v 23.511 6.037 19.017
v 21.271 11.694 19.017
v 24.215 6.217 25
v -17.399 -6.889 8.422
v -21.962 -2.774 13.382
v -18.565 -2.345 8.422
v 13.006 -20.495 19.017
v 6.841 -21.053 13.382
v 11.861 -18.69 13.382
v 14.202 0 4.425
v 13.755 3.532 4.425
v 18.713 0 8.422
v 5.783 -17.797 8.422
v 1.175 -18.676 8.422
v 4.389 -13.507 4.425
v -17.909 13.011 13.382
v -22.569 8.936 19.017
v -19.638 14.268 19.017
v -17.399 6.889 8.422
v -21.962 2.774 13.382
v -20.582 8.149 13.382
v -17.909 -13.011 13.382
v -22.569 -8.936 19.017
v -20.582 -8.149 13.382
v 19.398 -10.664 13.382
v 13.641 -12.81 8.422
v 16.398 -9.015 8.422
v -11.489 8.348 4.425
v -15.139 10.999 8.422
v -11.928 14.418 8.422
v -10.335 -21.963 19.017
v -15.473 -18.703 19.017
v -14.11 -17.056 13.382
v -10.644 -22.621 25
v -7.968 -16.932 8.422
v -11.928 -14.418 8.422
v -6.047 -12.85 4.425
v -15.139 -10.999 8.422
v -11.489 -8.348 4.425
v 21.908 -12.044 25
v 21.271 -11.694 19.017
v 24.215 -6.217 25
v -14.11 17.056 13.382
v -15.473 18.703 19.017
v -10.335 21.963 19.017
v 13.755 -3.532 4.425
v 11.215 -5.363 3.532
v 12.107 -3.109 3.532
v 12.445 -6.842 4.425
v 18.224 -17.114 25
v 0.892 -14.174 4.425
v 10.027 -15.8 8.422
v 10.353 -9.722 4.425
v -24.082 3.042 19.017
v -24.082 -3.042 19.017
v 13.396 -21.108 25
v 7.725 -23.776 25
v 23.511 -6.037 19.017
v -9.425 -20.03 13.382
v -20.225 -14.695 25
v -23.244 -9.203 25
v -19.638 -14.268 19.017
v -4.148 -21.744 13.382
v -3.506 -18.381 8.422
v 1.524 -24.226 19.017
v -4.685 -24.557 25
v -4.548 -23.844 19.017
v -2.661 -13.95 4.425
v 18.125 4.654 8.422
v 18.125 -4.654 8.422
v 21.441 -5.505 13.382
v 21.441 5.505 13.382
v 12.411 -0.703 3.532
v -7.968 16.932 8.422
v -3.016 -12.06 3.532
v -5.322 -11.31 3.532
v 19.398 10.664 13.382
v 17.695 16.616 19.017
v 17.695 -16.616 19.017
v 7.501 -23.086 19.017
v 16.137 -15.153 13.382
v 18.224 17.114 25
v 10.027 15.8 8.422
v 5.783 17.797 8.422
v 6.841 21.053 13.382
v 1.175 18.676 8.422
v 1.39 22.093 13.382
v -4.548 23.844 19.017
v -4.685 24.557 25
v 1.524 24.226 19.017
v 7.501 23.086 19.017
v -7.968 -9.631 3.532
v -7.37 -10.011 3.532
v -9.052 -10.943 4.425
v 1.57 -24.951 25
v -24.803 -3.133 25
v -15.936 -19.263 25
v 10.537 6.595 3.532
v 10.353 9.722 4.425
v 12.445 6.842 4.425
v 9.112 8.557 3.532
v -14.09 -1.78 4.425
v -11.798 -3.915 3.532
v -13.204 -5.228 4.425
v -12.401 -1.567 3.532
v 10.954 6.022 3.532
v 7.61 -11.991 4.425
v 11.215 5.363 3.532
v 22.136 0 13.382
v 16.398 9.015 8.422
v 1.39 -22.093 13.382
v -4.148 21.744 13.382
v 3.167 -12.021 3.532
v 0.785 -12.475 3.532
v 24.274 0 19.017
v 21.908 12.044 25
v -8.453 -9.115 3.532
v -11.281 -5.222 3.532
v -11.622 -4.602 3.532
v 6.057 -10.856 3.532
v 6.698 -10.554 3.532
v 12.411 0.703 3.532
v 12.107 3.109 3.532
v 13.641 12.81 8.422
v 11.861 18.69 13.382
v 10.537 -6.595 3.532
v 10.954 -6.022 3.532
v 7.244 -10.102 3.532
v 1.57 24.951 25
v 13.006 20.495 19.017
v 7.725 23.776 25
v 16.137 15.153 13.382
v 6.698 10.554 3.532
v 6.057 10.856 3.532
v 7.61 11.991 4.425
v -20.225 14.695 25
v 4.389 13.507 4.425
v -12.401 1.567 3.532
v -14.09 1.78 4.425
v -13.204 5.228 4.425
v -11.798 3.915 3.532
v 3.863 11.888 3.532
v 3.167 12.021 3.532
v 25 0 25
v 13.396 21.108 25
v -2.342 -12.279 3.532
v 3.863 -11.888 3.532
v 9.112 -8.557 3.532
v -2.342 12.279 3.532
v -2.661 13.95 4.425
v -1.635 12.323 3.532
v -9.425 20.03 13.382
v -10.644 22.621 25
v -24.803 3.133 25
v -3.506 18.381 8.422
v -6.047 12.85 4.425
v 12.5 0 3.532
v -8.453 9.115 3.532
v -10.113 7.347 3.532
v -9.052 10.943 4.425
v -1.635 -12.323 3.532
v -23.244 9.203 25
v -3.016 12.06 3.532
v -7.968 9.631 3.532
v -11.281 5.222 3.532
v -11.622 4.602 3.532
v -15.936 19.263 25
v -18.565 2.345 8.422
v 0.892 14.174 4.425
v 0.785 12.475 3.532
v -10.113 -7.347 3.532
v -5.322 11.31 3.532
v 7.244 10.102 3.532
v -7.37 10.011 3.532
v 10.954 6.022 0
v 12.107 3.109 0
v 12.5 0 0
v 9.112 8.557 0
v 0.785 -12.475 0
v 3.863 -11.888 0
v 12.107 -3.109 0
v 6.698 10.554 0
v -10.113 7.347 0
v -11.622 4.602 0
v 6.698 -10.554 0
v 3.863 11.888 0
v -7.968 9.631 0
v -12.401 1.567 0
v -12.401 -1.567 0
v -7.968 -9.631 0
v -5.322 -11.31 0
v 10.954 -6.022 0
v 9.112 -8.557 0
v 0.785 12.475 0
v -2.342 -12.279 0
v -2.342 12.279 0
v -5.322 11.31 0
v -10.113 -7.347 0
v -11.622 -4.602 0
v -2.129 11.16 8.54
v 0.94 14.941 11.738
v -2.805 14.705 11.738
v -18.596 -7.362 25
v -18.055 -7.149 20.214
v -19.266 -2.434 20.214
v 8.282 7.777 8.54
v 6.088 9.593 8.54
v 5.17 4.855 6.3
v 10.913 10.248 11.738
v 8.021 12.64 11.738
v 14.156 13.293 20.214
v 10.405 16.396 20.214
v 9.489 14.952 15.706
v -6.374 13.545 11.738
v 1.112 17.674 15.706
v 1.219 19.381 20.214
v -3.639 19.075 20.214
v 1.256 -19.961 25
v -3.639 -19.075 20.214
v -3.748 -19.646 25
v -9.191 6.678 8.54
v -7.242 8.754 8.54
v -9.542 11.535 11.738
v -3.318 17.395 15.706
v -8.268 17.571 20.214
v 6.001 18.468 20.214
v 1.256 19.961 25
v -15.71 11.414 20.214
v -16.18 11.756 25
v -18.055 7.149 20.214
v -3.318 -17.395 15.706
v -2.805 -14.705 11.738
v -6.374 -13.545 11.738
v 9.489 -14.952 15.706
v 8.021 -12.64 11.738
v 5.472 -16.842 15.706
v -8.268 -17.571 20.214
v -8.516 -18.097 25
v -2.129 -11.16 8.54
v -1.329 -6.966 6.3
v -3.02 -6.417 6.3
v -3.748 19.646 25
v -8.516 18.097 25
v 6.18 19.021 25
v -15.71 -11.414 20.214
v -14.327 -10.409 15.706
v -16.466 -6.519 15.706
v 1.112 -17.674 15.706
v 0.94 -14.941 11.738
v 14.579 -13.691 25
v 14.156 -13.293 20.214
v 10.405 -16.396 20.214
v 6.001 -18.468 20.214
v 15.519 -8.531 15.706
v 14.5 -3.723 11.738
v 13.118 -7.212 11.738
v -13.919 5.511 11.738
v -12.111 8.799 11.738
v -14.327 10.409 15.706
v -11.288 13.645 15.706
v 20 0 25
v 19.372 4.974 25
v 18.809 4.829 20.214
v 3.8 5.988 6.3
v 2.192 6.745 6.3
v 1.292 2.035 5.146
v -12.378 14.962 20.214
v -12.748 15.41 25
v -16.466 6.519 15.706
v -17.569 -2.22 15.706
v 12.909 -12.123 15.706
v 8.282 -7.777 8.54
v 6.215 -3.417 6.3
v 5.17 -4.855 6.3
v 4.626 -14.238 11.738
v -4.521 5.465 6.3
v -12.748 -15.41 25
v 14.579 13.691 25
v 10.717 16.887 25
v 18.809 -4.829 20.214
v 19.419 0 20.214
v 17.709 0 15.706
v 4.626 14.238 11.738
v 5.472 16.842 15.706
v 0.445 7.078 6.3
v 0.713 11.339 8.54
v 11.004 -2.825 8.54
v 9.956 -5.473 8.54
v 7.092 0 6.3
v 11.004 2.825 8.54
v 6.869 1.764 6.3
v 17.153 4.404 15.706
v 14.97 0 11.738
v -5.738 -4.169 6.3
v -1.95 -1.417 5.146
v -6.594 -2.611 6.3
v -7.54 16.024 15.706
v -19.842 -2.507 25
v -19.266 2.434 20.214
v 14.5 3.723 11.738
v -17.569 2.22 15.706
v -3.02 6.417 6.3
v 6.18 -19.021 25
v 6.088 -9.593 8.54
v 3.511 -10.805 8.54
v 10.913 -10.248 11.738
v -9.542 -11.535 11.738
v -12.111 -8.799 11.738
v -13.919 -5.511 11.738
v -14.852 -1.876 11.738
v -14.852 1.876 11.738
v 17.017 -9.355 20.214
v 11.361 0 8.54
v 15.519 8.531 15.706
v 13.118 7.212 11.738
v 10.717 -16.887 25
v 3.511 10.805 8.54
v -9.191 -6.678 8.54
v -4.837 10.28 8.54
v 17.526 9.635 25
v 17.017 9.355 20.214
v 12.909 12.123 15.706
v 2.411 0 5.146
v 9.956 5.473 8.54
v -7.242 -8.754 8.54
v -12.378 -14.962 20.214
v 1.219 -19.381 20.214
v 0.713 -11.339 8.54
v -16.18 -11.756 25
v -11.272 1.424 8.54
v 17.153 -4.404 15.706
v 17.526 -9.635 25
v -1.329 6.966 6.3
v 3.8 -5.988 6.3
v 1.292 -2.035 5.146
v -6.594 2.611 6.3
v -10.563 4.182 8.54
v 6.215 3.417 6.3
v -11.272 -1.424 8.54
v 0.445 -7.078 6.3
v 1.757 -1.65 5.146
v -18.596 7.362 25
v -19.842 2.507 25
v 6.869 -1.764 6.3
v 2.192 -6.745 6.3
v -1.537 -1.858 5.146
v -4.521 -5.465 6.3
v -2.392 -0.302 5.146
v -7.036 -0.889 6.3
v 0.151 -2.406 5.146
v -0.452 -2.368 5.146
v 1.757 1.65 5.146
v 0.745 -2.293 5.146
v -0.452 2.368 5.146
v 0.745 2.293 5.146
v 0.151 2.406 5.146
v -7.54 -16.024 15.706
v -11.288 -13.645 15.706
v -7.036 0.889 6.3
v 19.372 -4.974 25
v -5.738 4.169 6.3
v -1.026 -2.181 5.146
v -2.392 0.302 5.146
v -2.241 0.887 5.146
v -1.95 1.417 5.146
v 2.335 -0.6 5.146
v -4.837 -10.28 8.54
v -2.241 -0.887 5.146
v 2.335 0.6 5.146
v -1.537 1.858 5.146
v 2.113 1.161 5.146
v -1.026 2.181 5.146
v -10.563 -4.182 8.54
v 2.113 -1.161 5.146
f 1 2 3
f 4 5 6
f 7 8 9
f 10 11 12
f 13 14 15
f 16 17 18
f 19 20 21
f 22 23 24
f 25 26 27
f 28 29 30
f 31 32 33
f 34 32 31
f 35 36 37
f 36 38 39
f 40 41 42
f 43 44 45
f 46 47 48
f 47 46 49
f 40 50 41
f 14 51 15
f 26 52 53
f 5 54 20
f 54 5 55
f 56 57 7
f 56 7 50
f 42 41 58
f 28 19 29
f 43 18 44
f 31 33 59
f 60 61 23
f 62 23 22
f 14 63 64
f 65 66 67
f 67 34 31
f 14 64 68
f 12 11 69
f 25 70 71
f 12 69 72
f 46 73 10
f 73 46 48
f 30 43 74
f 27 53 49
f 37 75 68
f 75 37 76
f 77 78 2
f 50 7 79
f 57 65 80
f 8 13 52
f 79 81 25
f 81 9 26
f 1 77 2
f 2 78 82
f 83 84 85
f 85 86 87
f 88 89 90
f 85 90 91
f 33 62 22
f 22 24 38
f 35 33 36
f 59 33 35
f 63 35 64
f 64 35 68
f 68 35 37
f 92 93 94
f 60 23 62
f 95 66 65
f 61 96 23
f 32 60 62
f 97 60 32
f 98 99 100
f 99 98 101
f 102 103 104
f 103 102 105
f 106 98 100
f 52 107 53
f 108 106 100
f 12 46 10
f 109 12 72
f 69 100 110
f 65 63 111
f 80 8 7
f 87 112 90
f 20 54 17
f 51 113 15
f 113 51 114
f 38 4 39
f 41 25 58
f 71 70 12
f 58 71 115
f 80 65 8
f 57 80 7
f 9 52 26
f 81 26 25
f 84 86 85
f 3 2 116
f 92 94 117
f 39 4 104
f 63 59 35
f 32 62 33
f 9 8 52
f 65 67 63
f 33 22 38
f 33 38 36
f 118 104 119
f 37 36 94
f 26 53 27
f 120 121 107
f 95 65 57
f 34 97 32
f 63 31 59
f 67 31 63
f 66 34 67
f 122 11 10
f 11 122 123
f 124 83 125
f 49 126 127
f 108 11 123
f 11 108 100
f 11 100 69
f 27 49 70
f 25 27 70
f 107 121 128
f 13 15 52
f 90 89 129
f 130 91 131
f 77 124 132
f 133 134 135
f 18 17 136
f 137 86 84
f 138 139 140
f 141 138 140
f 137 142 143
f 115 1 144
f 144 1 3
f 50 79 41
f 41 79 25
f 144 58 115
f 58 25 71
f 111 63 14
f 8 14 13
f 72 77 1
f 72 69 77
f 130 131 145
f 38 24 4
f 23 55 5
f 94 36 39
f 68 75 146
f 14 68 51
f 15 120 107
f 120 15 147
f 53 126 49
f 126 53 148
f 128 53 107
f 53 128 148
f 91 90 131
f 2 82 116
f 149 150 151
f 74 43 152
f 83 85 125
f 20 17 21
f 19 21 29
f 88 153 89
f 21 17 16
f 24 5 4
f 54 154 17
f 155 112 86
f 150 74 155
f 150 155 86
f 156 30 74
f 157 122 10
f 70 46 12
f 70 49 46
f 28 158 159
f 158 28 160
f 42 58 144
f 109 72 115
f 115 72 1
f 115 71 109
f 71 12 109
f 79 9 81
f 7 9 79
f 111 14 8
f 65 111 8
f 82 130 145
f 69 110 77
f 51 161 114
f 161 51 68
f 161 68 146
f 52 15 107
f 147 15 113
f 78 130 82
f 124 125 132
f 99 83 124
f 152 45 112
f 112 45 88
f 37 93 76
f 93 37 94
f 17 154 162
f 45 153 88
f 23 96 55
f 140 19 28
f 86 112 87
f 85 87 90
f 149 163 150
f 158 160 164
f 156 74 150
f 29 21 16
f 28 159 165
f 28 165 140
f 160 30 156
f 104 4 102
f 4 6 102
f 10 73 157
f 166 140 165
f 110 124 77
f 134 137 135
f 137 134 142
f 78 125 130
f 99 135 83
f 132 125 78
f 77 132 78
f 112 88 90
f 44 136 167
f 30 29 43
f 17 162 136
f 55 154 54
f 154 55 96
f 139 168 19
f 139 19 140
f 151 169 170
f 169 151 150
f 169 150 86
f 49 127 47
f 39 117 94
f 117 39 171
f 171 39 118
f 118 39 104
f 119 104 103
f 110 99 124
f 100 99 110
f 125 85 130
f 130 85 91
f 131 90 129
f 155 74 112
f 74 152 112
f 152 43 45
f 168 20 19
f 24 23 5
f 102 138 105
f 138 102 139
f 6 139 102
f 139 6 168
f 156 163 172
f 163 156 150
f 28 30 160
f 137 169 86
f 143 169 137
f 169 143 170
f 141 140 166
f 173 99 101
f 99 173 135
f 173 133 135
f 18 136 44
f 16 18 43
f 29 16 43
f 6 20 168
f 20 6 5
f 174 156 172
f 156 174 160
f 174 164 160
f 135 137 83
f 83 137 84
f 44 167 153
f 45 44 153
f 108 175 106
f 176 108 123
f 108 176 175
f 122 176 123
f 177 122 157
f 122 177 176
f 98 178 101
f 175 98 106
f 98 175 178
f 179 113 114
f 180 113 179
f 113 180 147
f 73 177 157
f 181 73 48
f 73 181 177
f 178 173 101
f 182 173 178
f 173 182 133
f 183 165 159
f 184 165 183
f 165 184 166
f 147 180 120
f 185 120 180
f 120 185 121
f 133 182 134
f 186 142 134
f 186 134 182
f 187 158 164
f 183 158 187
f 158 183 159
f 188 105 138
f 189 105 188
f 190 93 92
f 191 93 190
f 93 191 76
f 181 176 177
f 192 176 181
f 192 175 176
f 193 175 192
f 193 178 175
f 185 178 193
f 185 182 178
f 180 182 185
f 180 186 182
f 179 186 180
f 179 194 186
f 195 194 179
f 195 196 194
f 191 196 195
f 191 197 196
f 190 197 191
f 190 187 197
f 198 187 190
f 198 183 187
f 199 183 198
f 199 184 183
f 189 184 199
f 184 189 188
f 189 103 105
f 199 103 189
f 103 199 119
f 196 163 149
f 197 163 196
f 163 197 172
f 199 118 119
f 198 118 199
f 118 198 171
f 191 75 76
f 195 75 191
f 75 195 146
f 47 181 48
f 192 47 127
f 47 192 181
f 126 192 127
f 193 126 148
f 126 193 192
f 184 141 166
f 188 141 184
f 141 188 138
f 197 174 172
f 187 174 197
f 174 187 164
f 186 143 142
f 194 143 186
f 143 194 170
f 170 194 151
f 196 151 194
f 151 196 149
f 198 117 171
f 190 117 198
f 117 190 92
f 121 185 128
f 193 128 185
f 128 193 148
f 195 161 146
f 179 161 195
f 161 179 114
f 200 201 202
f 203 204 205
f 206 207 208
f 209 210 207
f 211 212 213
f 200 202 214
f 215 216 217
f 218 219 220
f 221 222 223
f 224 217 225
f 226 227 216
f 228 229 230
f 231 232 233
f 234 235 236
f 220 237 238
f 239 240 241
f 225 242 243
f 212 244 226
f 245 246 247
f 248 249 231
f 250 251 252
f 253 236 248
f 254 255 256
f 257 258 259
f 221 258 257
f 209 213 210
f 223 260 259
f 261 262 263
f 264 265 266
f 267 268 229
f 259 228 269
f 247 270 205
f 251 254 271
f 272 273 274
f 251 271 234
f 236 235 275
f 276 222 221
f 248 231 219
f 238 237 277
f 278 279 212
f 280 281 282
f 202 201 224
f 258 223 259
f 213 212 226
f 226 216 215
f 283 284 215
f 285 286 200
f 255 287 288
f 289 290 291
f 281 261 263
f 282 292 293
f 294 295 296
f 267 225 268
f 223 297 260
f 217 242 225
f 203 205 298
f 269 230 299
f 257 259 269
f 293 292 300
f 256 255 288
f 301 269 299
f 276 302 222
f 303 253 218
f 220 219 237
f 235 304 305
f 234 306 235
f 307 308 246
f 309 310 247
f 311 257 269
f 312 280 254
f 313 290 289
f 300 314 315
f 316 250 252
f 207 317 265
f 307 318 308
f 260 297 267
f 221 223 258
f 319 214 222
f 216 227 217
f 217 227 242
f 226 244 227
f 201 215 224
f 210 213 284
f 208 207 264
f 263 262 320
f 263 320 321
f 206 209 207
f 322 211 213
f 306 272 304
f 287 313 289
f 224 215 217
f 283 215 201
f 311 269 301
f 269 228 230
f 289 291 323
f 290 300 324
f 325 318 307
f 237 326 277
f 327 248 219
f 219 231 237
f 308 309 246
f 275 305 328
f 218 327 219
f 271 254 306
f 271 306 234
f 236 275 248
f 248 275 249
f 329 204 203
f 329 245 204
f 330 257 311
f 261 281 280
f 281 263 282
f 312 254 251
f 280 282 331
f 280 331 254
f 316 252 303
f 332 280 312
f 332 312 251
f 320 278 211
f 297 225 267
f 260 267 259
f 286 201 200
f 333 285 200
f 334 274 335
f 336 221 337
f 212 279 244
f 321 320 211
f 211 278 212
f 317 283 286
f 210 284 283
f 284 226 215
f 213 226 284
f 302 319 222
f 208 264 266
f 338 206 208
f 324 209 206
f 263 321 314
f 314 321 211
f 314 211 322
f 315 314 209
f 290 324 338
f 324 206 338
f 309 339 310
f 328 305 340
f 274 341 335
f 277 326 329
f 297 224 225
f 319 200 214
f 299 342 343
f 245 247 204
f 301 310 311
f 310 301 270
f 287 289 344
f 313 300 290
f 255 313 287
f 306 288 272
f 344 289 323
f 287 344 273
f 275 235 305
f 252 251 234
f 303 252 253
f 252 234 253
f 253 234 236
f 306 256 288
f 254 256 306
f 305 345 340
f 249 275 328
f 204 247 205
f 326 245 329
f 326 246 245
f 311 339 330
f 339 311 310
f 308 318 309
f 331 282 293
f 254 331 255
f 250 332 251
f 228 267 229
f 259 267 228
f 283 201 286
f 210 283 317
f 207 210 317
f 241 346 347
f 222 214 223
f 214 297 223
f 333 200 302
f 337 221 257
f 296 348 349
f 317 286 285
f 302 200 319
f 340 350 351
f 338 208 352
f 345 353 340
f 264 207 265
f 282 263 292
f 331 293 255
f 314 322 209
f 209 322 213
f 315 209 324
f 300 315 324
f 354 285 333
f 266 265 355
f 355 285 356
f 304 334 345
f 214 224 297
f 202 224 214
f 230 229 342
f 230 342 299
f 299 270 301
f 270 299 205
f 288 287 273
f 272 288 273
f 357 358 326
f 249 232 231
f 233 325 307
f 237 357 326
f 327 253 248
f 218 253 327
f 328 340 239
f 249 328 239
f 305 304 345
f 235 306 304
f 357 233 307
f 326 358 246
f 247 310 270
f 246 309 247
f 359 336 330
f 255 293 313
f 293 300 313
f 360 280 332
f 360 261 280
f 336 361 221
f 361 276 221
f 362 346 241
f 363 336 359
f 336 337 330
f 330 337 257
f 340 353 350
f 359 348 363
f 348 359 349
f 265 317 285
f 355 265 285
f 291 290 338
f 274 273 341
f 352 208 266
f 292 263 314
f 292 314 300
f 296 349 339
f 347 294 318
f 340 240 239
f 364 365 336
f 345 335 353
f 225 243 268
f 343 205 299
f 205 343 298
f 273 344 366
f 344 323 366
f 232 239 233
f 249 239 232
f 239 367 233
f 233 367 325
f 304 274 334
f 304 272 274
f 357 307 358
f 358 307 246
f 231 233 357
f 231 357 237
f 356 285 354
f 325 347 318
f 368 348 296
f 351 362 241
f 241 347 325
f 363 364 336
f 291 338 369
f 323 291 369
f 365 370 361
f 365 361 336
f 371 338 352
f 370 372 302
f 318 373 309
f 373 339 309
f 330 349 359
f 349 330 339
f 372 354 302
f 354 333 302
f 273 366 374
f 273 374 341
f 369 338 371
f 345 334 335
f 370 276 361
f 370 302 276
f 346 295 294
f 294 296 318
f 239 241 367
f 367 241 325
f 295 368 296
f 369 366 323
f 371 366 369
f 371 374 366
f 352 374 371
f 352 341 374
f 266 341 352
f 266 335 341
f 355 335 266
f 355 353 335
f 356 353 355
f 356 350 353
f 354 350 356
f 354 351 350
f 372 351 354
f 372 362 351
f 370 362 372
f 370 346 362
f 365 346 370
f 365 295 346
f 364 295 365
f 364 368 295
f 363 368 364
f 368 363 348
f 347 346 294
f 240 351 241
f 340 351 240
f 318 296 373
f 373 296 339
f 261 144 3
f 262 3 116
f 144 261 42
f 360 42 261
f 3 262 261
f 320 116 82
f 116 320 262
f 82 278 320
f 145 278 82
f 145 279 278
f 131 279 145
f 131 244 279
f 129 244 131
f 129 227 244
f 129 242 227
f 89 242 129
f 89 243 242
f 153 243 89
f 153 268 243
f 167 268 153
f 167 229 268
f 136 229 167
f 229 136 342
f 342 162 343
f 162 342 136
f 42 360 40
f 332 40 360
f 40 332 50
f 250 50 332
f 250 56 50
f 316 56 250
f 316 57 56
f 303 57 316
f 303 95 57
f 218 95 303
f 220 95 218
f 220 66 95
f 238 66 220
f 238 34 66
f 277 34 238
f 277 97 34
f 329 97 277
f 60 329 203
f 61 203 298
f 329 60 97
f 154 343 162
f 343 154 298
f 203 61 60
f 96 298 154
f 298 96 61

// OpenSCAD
//Customizable Bowl

// Outer Diameter
d = 50;

// Base Diameter
b = 25;

// Thickness
t = 5;

// Smoothness
n = 25;

$fn = n;

// Main Body
difference(){
difference(){
    union(){
        translate([0,0,d/2])
            sphere(d = d,center = false);
        cylinder(h = d/2, r1 = b/2, r2 = b/2, center = false);

} // Union End - Main Body

translate([0,0,d/2])
    sphere(d=(d-2*t),center=false);
} // Difference End - Inner Shell

translate([0,0,d])
    cube([d,d,d],center = true);
} // Difference End - Lid
